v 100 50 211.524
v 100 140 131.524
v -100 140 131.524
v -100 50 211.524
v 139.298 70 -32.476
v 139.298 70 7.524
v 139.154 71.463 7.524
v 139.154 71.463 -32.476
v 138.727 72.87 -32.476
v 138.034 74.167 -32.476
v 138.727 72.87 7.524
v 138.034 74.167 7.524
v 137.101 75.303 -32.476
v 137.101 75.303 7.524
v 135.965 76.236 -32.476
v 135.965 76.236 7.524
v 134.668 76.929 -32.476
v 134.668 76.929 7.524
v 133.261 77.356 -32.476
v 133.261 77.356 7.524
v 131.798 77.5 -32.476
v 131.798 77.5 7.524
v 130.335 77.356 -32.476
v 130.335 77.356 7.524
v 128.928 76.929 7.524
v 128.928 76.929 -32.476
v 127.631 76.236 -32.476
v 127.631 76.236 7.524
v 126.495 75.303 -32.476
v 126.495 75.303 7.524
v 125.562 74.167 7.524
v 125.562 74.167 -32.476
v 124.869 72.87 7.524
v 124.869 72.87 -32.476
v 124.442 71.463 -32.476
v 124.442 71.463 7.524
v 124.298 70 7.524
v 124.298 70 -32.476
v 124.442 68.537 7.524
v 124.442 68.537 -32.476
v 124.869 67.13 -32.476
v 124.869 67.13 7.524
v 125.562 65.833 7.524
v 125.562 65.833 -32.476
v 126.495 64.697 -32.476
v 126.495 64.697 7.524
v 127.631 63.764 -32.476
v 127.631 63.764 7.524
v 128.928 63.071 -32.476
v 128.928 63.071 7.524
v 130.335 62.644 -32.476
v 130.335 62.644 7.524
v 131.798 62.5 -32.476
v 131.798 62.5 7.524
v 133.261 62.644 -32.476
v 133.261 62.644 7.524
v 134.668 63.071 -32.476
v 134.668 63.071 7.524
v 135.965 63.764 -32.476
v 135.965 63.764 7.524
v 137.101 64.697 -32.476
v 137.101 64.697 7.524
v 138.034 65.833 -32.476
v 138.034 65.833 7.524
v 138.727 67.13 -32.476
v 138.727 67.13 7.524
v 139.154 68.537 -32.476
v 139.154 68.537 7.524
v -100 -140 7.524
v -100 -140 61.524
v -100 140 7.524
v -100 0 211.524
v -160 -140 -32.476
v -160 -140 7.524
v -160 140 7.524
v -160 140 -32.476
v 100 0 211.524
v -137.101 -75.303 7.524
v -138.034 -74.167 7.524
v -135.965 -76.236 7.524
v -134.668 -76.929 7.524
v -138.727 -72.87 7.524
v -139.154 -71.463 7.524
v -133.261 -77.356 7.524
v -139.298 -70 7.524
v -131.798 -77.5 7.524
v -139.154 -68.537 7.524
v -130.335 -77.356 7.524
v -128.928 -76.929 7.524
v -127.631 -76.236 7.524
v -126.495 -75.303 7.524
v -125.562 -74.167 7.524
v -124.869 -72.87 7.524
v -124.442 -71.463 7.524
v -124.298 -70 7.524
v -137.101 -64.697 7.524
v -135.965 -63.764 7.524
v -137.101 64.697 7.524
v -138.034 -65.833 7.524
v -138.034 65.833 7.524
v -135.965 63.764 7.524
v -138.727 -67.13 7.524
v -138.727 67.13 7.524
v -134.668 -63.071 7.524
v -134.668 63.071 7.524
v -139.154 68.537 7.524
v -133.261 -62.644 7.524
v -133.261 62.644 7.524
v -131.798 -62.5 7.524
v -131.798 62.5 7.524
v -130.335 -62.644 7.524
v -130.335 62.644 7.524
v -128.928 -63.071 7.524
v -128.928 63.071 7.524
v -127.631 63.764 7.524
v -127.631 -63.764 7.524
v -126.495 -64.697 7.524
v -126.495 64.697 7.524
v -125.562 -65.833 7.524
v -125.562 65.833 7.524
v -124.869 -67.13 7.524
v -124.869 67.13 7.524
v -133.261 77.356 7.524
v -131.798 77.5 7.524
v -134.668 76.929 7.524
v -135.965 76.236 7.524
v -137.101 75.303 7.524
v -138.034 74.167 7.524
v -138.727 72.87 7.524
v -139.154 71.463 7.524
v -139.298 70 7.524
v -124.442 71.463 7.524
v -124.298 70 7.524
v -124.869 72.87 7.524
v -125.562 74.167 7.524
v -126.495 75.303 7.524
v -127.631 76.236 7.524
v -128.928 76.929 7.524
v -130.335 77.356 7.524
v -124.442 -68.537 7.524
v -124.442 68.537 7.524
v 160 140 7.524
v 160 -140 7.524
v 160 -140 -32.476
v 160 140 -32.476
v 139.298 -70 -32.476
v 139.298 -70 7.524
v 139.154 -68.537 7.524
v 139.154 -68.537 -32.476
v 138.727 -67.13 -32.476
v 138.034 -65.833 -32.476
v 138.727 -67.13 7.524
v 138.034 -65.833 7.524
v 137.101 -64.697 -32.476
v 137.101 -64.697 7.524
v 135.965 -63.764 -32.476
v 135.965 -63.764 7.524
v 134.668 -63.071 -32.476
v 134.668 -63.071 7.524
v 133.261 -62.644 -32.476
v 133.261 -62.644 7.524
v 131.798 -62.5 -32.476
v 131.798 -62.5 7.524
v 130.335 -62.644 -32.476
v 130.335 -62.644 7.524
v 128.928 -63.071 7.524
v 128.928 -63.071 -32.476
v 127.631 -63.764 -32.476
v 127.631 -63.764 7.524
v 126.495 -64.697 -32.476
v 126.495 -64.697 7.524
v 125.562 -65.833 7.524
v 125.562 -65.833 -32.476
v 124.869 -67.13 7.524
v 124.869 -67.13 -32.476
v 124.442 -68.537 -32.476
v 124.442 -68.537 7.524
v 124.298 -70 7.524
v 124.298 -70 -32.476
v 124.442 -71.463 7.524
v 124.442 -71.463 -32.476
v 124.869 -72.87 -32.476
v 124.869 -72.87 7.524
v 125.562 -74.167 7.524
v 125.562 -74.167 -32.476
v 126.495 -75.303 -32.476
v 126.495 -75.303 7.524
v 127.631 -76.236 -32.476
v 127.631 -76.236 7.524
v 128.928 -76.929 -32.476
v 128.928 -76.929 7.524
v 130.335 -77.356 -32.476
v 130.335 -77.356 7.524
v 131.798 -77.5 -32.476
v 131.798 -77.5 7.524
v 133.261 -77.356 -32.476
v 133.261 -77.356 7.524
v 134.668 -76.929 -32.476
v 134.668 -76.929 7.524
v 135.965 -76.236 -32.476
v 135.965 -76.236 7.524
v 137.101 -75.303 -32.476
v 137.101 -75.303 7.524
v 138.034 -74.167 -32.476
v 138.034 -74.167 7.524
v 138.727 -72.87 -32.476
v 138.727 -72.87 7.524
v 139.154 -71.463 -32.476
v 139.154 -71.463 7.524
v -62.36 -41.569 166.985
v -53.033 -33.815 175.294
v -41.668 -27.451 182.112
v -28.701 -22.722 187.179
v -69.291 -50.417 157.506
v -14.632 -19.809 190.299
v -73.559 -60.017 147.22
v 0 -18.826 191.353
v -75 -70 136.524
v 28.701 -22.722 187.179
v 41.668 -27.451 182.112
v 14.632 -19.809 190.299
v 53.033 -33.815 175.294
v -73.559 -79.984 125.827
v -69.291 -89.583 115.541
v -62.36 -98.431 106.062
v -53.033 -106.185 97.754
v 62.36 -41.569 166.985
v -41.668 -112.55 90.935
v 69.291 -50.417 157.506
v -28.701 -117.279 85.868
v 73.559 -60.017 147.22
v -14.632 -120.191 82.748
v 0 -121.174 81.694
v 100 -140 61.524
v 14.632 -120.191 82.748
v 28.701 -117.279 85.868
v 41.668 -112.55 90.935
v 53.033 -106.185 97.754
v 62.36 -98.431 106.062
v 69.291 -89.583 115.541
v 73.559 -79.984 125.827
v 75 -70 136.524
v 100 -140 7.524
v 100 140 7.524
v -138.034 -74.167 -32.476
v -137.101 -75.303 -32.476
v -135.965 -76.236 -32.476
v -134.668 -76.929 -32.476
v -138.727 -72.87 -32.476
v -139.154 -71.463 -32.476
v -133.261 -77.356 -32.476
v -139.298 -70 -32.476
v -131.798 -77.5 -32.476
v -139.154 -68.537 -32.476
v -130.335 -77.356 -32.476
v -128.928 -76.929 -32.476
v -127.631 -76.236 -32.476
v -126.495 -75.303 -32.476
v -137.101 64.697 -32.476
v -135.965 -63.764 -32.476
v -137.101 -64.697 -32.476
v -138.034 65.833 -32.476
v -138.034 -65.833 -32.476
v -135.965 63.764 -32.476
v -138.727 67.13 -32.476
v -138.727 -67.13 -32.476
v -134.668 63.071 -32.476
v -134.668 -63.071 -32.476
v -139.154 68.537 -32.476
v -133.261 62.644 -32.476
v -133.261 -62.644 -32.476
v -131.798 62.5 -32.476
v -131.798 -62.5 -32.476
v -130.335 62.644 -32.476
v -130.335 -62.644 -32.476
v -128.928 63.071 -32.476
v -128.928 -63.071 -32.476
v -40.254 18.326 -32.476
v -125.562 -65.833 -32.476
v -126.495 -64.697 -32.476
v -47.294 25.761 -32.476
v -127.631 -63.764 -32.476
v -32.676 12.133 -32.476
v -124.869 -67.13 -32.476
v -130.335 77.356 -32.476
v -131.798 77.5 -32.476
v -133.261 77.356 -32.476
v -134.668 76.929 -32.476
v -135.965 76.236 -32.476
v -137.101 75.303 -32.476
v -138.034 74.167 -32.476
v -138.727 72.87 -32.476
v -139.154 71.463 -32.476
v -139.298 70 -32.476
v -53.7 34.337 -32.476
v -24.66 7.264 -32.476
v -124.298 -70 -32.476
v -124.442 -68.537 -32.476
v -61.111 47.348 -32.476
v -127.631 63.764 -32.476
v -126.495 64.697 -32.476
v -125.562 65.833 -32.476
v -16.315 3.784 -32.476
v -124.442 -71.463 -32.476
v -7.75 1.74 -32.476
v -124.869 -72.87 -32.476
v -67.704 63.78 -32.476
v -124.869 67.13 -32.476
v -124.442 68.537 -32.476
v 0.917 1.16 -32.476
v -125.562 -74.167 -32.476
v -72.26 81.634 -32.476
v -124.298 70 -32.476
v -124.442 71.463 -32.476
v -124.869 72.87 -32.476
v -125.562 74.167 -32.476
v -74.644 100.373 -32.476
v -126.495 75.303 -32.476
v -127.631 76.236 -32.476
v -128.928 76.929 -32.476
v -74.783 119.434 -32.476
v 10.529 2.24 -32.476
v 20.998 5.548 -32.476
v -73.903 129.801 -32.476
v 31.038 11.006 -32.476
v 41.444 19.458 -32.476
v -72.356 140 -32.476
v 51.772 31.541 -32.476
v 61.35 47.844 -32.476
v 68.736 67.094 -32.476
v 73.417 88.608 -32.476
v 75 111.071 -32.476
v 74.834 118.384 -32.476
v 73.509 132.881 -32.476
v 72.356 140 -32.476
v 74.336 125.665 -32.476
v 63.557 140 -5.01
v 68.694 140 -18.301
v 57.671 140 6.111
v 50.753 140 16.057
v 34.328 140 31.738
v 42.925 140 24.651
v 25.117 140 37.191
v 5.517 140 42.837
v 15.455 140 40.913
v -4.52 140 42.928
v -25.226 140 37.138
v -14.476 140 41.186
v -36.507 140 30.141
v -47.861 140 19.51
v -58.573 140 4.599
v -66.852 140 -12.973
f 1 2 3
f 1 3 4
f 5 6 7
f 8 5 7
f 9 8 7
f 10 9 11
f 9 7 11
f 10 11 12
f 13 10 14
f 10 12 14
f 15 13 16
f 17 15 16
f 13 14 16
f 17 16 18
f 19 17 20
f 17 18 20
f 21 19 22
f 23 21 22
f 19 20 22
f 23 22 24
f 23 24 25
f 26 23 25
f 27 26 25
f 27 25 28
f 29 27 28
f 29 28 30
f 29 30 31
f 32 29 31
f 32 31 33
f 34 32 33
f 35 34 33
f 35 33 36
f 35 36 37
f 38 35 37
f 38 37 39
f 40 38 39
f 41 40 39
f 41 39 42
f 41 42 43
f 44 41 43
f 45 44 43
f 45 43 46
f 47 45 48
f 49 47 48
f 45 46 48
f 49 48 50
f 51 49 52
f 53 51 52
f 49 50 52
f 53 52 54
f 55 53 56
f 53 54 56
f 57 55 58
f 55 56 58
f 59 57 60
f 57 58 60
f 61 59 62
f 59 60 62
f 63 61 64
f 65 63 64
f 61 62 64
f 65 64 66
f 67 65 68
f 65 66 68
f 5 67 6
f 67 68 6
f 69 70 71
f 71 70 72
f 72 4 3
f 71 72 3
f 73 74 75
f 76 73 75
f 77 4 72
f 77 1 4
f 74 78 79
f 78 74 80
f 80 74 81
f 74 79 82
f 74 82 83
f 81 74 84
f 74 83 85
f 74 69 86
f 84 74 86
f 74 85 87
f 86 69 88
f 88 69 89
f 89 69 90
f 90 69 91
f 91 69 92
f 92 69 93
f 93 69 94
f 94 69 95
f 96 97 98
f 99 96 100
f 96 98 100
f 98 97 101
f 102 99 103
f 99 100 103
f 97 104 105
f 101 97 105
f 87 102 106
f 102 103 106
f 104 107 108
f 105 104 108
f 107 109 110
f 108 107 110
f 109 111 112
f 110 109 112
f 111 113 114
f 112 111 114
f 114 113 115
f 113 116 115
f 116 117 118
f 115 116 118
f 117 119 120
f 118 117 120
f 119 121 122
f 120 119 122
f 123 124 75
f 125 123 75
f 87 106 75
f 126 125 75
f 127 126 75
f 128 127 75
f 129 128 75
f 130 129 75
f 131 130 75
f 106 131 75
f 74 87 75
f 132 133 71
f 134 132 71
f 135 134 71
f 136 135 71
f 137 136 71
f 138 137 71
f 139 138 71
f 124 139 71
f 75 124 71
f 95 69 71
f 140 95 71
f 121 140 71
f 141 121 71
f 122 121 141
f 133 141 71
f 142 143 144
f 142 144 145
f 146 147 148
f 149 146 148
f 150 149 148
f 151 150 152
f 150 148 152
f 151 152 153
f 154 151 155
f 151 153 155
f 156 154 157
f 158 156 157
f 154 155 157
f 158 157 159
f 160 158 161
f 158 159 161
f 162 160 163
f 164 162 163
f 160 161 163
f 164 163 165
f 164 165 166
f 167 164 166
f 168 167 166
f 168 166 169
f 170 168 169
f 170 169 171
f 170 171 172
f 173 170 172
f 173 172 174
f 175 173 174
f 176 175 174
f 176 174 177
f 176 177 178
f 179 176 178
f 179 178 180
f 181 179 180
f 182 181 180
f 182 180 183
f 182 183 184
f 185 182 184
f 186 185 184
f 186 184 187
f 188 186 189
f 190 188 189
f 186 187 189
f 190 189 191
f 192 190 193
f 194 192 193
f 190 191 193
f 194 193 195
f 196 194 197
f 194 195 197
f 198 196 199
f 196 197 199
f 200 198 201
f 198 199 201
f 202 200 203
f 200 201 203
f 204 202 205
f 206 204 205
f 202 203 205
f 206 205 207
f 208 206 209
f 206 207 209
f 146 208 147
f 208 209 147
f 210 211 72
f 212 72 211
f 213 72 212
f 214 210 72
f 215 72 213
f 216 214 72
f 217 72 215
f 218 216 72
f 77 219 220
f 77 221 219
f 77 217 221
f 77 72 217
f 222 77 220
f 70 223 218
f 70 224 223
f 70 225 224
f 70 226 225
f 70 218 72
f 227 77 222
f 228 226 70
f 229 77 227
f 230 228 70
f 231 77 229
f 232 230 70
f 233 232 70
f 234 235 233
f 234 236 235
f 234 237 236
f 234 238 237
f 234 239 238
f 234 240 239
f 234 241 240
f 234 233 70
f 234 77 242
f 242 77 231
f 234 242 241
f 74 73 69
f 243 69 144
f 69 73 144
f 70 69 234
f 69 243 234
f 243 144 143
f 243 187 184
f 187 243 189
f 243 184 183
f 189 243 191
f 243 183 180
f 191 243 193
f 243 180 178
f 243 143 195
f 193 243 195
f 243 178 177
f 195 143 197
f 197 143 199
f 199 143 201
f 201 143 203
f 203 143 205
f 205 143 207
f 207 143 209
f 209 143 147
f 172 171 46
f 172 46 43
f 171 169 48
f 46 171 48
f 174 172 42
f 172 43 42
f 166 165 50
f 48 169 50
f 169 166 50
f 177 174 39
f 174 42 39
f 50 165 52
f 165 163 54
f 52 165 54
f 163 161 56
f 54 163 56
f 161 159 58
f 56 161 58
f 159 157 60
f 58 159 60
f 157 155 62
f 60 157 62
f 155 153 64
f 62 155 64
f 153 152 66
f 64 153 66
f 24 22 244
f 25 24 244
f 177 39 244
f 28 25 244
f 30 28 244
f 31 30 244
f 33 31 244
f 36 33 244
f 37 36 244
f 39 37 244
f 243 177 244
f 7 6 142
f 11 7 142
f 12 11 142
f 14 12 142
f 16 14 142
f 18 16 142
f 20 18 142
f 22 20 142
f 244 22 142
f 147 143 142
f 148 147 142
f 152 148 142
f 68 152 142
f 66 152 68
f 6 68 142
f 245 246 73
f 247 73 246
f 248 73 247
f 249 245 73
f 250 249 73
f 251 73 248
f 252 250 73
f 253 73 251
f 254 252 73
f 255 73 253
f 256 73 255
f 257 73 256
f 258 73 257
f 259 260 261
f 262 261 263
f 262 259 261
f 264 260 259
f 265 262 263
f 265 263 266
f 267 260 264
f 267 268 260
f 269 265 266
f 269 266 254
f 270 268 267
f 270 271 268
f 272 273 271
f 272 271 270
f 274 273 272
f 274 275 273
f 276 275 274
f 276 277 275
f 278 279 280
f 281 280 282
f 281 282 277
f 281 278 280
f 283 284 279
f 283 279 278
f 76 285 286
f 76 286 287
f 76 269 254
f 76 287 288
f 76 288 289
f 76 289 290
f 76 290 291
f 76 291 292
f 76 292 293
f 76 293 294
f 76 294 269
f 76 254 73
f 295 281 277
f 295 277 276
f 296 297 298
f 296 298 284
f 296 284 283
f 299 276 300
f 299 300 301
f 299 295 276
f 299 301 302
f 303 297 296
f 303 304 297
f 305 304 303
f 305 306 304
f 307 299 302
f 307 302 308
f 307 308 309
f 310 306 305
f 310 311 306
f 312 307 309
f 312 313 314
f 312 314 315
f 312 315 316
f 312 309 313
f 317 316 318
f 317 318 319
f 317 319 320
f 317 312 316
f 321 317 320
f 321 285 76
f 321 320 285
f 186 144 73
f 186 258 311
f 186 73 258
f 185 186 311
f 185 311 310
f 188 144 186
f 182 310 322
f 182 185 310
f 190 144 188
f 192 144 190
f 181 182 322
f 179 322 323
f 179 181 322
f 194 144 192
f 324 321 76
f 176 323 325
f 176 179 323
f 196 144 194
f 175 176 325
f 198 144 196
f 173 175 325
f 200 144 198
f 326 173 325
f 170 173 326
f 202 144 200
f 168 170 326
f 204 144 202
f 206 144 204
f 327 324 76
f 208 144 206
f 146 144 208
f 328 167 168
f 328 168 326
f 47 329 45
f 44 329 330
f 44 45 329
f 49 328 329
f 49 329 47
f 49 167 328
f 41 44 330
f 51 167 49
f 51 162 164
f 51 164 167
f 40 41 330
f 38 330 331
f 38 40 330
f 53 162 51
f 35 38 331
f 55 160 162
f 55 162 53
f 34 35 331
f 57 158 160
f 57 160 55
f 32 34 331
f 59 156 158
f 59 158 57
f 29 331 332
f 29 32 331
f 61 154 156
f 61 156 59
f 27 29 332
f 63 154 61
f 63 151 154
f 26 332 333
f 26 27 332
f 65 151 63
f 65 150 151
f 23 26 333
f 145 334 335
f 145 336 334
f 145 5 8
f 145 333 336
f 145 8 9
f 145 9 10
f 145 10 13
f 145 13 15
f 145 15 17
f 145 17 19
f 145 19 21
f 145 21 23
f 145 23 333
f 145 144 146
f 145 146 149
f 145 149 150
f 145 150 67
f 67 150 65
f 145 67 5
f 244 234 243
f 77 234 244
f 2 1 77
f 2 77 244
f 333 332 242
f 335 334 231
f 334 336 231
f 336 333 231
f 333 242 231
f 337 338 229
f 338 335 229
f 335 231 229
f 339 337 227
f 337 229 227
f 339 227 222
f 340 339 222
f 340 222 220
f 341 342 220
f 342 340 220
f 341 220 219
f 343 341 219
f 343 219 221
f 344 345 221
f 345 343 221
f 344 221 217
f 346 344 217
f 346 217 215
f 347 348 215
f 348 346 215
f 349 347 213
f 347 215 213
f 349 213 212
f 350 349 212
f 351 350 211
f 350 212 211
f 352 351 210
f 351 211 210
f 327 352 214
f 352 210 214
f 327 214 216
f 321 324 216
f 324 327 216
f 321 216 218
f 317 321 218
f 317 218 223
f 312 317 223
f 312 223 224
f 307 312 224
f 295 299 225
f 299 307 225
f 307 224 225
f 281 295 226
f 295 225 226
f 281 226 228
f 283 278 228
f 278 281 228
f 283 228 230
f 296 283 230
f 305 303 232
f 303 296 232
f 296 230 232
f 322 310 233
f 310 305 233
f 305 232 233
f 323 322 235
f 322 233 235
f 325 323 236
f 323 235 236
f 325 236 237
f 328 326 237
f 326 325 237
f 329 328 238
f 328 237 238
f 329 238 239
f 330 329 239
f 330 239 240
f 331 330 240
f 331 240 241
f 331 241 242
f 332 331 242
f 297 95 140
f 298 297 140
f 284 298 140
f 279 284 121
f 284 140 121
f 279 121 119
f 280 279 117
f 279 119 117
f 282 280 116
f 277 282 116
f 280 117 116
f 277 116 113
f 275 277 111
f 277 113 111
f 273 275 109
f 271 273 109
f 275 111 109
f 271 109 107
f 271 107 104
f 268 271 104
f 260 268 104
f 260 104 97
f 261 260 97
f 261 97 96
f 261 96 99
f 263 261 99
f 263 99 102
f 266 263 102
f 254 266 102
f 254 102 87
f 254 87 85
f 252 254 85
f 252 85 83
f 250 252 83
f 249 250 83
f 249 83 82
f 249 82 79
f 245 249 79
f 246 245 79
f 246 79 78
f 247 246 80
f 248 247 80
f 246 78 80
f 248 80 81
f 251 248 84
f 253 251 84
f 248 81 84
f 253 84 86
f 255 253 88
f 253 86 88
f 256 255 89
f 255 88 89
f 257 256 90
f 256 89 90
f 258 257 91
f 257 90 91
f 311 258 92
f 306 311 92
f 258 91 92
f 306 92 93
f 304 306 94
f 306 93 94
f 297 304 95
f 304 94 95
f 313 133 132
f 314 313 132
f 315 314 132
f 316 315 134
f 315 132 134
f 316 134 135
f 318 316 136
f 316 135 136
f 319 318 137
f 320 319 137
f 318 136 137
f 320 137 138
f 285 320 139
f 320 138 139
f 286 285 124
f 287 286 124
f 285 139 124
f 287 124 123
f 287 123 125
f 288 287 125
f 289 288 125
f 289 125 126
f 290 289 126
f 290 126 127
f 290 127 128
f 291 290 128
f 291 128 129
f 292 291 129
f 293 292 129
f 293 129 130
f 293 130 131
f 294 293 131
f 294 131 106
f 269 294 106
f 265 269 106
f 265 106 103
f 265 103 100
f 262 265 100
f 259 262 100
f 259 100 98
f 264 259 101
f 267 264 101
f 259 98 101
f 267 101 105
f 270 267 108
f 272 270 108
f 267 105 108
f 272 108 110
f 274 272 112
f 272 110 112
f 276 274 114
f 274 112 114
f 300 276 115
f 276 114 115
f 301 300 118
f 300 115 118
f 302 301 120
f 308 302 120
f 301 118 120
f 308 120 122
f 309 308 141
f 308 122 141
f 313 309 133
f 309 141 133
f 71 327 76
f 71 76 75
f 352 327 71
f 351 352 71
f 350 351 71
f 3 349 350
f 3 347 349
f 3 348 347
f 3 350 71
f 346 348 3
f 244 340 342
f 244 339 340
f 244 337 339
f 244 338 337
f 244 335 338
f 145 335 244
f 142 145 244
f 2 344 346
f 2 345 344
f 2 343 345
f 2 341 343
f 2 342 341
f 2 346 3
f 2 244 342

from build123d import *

# Parameters (mm, degrees)
F0_W     = 280
F0_H     = 40
F1_DEPTH = 160
F2_DEPTH = 100
F3_R     = 7.5
F4_DEPTH = 50
F5_R     = 75
F6_DEPTH = 421.5


with BuildPart() as f1:
    # F0 (on Right) → F1 (new body, symmetric)
    with BuildSketch(Plane.YZ):
        with Locations((0, -12.4763777256)):
            Rectangle(F0_W, F0_H)
    extrude(amount=F1_DEPTH, both=True)

    # F0 (on Right) → F2 (join, symmetric)
    with BuildSketch(Plane.YZ):
        Polygon((-140, 61.5236222744), (-140, 7.5236222744), (140, 7.5236222744), (140, 131.5236222744), (50, 211.5236222744), (0, 211.5236222744), align=None)
    extrude(amount=F2_DEPTH, both=True)

    # F3 (on face) → F4 (cut)
    with BuildSketch(Plane.XY.offset(7.5236222744)):
        with Locations((-131.7980587482, 70)):
            Circle(F3_R)
        with Locations((-131.7980587482, -70)):
            Circle(F3_R)
        with Locations((131.7980587482, 70)):
            Circle(F3_R)
        with Locations((131.7980587482, -70)):
            Circle(F3_R)
    extrude(amount=-F4_DEPTH, mode=Mode.SUBTRACT)

    # F5 (on face) → F6 (cut)
    with BuildSketch(Plane(origin=(0, -105.5105954338, 98.4765557382), x_dir=(1, 0, 0), z_dir=(0, -0.7310552682, 0.6823182504))):
        with Locations((0, 52.0439584215)):
            Circle(F5_R)
    extrude(amount=-F6_DEPTH, mode=Mode.SUBTRACT)


solid = f1.part
